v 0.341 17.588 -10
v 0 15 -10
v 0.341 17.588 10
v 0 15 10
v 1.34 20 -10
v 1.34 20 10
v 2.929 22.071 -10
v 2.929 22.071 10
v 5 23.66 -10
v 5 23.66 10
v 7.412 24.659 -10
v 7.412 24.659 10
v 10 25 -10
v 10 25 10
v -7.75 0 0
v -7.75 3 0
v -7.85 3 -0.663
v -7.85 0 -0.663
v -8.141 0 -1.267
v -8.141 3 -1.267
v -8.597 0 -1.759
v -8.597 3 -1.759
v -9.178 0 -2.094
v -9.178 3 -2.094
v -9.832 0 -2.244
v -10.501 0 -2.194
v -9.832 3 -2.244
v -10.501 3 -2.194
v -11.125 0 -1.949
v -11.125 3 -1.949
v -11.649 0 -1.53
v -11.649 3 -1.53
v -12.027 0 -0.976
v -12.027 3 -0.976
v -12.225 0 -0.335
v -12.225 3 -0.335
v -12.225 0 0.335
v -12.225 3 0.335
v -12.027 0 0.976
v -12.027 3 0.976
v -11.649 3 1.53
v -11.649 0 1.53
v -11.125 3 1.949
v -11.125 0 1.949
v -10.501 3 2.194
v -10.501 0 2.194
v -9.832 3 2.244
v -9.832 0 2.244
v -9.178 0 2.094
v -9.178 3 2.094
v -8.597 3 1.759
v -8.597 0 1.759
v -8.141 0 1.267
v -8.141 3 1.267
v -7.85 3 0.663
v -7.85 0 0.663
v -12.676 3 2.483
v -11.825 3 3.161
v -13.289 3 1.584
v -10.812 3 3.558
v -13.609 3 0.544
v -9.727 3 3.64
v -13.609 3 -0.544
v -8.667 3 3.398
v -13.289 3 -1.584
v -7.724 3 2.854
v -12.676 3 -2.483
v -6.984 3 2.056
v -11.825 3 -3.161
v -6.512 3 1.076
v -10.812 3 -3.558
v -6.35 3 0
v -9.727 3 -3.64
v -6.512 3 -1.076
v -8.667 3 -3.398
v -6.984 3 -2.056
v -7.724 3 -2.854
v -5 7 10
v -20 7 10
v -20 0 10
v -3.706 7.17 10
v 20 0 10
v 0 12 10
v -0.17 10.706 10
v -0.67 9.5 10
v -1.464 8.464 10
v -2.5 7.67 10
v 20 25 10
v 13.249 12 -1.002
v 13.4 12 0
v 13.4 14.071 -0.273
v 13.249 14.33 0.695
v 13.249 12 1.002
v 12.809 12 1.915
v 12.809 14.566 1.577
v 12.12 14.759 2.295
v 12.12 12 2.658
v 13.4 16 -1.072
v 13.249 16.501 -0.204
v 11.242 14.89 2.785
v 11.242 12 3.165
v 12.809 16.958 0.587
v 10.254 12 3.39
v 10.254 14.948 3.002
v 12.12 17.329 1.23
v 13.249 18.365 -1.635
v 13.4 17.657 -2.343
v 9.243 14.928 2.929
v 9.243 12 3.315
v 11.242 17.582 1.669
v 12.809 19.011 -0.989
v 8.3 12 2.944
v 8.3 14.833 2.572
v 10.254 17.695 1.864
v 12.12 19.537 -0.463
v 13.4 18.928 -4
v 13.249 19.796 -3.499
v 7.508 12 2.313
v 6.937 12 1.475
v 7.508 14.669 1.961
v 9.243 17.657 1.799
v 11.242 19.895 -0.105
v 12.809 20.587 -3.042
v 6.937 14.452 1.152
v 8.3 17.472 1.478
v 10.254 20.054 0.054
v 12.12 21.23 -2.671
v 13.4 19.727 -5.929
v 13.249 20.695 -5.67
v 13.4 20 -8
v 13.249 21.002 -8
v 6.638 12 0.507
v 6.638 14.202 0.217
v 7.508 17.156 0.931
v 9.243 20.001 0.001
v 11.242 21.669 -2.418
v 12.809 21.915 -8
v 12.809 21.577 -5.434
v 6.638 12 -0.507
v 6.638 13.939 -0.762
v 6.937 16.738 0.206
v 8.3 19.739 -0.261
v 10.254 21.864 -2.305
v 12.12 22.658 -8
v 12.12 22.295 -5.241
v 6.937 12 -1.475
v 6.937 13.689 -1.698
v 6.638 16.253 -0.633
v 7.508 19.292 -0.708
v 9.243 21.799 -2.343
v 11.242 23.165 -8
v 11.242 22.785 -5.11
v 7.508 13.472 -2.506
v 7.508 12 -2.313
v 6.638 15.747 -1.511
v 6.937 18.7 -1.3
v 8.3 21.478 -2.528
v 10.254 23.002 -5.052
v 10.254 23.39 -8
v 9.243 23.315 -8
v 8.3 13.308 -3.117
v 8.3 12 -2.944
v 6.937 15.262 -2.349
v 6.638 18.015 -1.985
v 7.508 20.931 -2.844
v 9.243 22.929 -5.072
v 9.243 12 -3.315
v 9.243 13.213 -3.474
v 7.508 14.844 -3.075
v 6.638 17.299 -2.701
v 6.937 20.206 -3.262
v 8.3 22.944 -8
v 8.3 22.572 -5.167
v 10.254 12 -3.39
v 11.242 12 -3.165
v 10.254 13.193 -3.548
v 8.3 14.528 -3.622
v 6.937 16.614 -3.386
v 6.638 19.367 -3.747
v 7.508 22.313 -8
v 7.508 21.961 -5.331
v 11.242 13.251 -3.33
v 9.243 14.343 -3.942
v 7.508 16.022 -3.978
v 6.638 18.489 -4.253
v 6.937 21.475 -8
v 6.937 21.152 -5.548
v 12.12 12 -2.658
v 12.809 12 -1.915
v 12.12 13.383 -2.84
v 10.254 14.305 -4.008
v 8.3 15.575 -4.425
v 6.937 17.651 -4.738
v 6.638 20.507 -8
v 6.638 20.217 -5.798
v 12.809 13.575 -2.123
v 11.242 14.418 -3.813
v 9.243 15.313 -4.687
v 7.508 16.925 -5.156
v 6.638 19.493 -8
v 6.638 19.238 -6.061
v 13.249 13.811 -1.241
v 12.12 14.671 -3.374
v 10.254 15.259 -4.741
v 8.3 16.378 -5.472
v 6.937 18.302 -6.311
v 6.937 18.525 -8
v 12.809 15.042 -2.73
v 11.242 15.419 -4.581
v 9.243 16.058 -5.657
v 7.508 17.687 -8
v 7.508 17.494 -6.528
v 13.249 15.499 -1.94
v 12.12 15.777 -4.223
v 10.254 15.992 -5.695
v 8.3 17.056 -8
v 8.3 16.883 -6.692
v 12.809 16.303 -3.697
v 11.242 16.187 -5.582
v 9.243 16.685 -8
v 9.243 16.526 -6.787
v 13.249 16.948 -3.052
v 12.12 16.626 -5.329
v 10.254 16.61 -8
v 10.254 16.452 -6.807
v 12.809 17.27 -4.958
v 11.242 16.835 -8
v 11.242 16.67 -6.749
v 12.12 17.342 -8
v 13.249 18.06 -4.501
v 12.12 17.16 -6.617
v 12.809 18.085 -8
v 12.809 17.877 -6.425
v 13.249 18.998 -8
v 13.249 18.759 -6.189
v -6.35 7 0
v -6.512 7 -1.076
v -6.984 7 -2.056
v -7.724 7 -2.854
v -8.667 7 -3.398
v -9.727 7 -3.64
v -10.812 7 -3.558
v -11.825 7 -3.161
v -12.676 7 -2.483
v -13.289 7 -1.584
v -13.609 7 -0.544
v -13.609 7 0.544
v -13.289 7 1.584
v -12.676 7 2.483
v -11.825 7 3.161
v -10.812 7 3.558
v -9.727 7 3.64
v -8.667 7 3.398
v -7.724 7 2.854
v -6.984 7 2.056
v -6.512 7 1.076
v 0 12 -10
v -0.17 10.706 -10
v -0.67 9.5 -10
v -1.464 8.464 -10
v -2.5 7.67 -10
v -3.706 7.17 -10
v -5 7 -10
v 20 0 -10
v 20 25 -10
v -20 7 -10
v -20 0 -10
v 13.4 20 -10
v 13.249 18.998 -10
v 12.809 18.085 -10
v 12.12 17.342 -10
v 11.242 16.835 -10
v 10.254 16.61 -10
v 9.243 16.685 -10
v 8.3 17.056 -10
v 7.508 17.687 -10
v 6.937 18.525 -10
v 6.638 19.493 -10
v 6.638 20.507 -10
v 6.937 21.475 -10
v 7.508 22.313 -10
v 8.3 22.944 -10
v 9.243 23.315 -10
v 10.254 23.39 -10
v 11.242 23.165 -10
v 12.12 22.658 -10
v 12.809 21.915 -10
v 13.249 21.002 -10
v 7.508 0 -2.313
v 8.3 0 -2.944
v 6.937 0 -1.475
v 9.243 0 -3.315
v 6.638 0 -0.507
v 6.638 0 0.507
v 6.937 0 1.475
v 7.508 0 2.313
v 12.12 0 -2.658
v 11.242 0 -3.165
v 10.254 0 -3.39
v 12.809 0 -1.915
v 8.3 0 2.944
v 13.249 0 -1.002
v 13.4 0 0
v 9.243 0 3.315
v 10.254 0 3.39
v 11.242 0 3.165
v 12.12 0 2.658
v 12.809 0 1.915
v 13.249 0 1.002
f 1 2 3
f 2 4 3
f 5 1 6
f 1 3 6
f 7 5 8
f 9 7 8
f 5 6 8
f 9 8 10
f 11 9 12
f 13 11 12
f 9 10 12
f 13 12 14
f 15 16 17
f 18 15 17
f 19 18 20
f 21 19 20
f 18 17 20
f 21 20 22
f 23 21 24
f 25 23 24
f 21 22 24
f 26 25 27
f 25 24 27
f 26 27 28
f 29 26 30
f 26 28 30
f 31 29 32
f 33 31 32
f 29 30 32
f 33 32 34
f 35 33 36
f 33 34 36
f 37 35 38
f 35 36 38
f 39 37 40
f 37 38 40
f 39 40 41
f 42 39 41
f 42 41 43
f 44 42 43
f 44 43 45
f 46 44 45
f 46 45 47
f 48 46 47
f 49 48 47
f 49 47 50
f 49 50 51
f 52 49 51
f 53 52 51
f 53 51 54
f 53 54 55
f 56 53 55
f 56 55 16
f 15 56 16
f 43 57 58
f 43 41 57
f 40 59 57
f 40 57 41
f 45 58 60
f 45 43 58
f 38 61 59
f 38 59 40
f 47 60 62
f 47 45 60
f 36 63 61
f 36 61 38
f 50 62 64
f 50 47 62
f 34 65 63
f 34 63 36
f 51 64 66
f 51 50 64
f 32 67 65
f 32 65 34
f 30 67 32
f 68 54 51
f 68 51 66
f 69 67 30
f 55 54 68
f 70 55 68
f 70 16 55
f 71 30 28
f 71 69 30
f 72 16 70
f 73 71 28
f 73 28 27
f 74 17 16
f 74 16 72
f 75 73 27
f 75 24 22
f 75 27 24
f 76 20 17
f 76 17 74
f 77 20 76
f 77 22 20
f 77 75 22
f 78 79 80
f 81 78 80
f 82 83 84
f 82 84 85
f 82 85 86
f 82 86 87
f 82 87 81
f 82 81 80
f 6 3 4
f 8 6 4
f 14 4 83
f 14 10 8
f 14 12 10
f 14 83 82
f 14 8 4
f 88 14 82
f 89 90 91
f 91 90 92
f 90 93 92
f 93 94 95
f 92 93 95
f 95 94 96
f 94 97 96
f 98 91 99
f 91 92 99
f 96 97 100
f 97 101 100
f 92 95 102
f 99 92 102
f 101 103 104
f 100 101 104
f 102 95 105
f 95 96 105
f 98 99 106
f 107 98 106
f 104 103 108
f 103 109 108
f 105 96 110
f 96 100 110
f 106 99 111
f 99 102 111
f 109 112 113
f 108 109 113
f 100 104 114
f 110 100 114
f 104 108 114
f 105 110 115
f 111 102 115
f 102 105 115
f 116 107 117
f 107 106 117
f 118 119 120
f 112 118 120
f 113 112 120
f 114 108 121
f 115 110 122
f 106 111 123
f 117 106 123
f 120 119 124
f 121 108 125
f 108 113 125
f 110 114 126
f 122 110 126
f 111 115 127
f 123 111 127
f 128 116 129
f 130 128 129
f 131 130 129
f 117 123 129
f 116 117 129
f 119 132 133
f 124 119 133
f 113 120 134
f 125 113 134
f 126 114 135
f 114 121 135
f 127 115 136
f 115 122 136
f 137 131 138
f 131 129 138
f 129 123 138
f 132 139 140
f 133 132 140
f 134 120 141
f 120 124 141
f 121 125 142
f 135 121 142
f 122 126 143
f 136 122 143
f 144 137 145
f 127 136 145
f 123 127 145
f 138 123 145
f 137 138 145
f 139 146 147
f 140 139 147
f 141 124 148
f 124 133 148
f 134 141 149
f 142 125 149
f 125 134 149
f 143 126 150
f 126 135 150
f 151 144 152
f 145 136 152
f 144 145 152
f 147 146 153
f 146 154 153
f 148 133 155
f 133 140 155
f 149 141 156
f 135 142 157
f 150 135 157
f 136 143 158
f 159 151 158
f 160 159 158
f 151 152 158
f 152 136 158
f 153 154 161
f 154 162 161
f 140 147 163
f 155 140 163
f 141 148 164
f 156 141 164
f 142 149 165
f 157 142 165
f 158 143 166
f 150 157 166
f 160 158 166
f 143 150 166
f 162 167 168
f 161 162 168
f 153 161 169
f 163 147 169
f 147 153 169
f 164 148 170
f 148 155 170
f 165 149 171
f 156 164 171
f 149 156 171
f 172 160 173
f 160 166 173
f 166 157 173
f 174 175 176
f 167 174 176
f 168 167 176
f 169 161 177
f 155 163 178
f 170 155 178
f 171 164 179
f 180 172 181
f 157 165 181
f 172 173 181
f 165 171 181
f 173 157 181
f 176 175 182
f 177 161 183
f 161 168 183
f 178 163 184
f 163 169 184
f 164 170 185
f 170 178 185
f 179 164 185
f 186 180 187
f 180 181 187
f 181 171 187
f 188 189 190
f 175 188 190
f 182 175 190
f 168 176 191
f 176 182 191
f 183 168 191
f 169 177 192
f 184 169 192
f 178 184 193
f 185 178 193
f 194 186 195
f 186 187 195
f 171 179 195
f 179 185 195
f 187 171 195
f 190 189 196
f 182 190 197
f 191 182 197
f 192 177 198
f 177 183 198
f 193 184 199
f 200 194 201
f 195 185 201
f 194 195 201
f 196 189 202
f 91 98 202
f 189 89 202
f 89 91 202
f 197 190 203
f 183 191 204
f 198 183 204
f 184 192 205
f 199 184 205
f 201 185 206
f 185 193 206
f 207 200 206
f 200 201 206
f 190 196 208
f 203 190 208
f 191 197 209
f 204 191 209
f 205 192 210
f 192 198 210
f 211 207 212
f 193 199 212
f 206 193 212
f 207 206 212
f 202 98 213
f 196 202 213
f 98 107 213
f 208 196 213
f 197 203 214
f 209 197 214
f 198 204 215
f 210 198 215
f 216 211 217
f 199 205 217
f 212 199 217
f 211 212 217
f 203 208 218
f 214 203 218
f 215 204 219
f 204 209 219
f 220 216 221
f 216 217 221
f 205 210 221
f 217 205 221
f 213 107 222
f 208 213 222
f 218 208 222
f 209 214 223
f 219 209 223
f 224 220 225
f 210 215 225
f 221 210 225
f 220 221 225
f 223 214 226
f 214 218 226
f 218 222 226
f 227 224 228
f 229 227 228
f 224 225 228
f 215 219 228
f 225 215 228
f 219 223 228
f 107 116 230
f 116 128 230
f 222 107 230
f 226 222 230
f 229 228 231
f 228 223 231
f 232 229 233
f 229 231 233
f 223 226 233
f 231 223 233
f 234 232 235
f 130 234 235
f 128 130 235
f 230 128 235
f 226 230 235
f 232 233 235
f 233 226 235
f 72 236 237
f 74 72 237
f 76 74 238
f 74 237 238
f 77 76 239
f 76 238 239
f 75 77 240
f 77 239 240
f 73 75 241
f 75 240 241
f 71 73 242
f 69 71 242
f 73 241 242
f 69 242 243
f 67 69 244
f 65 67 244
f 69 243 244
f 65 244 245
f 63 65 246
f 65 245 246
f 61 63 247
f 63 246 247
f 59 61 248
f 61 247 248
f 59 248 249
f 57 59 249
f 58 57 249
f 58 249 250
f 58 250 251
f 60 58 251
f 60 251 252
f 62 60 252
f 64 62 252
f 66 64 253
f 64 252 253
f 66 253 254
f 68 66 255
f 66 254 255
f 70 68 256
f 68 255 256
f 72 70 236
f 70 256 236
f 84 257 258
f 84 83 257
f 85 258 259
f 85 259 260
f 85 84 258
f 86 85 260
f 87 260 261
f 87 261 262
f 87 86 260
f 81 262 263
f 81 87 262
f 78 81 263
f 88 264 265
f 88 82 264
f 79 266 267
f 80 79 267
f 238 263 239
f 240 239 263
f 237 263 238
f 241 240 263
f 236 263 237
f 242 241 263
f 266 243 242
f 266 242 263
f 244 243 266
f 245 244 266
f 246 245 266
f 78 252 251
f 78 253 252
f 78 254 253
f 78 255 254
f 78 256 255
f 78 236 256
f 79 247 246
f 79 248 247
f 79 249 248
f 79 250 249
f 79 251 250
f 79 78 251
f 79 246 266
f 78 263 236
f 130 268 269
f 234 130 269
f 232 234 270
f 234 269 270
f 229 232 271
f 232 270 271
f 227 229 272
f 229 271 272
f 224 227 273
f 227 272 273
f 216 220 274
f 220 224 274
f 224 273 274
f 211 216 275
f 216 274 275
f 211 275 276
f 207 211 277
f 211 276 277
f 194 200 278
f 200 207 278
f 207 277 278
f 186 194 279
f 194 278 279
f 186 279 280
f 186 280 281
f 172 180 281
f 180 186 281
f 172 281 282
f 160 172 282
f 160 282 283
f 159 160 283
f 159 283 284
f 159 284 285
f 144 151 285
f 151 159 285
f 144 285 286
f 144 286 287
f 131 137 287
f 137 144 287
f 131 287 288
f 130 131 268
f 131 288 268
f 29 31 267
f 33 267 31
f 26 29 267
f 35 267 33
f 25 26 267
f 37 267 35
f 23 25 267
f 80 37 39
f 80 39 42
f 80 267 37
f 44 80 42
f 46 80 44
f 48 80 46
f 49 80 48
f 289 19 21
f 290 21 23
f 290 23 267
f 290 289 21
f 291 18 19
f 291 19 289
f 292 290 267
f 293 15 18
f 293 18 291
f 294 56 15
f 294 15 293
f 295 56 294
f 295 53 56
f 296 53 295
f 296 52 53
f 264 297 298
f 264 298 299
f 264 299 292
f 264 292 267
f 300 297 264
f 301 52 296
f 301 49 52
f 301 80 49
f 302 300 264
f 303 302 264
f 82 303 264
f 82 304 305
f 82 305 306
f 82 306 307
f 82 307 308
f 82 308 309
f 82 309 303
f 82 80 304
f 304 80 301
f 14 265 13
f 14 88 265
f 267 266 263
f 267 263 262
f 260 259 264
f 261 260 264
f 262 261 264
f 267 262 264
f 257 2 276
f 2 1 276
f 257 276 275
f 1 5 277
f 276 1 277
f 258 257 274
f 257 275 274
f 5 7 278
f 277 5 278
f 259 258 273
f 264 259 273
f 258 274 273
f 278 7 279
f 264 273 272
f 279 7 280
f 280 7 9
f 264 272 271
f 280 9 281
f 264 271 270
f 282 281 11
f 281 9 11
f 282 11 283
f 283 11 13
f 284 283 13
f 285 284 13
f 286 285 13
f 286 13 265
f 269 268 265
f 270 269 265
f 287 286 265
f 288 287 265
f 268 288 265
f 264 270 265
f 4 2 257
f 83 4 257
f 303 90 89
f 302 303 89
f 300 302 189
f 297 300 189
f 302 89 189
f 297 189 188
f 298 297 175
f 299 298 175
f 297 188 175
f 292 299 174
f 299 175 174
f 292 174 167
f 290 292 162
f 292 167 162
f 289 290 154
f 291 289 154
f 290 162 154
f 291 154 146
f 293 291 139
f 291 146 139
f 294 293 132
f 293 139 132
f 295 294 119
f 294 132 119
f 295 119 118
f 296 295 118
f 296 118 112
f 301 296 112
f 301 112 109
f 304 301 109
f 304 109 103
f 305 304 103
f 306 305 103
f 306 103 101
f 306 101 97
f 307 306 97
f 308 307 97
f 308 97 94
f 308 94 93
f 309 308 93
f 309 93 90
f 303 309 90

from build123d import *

# Parameters (mm, degrees)
EXTRUDE_1_DEPTH     = 10
SKETCH_2_R          = 3.65
CUT_EXTRUDE_1_DEPTH = 4
CUT_EXTRUDE_2_REACH = 5
SKETCH_3_R          = 2.25
SKETCH_4_R          = 3.4
FILLET_1_R          = 5
FILLET_2_R          = 10


with BuildPart() as part:
    # 草圖1 → 填料-伸長1 (new body, symmetric)
    with BuildSketch(Plane.XY):
        Polygon((20, 0), (20, 25), (0, 25), (0, 7), (-20, 7), (-20, 0), align=None)
    extrude(amount=EXTRUDE_1_DEPTH, both=True)

    # 草圖2 → 除料-伸長1 (cut)
    with BuildSketch(Plane(origin=(0, 7, 0), x_dir=(1, 0, 0), z_dir=(0, 1, 0))):
        with Locations((-10, 0)):
            Circle(SKETCH_2_R)
    extrude(amount=-CUT_EXTRUDE_1_DEPTH, mode=Mode.SUBTRACT)

    # 草圖3 → 除料-伸長2 (cut, up to next)
    with BuildSketch(Plane(origin=(0, 3, 0), x_dir=(1, 0, 0), z_dir=(0, 1, 0)), mode=Mode.PRIVATE) as cut_extrude_2_sk1:
        with Locations((-10, 0)):
            Circle(SKETCH_3_R)
    cut_extrude_2_tool1 = extrude(cut_extrude_2_sk1.sketch, amount=-CUT_EXTRUDE_2_REACH, mode=Mode.PRIVATE) & part.part
    add(cut_extrude_2_tool1.solids().sort_by_distance((-10, 3, 0))[0], mode=Mode.SUBTRACT)

    # 除料-掃出1: sweep along a path in 草圖5
    with BuildLine(Plane(origin=(10, 0, 10), x_dir=(0, 0, -1), z_dir=(1, 0, 0))) as sweep_1_path:
        Line((10, 0), (10, 12))
        ThreePointArc((10, 12), (12.343145751, 17.656854249), (18, 20))
        Line((18, 20), (20, 20))
    # 草圖4 → 除料-掃出1 (sweep, cut)
    with BuildSketch(Plane.XZ):
        with Locations((10, 0)):
            Circle(SKETCH_4_R)
    sweep(path=sweep_1_path.line, mode=Mode.SUBTRACT)

    # 圓角1
    fillet_1_edges = [part.edges().sort_by_distance(p)[0] for p in [
        (0, 7, 0),
    ]]
    fillet(fillet_1_edges, radius=FILLET_1_R)

    # 圓角2
    fillet_2_edges = [part.edges().sort_by_distance(p)[0] for p in [
        (0, 25, 0),
    ]]
    fillet(fillet_2_edges, radius=FILLET_2_R)


solid = part.part
